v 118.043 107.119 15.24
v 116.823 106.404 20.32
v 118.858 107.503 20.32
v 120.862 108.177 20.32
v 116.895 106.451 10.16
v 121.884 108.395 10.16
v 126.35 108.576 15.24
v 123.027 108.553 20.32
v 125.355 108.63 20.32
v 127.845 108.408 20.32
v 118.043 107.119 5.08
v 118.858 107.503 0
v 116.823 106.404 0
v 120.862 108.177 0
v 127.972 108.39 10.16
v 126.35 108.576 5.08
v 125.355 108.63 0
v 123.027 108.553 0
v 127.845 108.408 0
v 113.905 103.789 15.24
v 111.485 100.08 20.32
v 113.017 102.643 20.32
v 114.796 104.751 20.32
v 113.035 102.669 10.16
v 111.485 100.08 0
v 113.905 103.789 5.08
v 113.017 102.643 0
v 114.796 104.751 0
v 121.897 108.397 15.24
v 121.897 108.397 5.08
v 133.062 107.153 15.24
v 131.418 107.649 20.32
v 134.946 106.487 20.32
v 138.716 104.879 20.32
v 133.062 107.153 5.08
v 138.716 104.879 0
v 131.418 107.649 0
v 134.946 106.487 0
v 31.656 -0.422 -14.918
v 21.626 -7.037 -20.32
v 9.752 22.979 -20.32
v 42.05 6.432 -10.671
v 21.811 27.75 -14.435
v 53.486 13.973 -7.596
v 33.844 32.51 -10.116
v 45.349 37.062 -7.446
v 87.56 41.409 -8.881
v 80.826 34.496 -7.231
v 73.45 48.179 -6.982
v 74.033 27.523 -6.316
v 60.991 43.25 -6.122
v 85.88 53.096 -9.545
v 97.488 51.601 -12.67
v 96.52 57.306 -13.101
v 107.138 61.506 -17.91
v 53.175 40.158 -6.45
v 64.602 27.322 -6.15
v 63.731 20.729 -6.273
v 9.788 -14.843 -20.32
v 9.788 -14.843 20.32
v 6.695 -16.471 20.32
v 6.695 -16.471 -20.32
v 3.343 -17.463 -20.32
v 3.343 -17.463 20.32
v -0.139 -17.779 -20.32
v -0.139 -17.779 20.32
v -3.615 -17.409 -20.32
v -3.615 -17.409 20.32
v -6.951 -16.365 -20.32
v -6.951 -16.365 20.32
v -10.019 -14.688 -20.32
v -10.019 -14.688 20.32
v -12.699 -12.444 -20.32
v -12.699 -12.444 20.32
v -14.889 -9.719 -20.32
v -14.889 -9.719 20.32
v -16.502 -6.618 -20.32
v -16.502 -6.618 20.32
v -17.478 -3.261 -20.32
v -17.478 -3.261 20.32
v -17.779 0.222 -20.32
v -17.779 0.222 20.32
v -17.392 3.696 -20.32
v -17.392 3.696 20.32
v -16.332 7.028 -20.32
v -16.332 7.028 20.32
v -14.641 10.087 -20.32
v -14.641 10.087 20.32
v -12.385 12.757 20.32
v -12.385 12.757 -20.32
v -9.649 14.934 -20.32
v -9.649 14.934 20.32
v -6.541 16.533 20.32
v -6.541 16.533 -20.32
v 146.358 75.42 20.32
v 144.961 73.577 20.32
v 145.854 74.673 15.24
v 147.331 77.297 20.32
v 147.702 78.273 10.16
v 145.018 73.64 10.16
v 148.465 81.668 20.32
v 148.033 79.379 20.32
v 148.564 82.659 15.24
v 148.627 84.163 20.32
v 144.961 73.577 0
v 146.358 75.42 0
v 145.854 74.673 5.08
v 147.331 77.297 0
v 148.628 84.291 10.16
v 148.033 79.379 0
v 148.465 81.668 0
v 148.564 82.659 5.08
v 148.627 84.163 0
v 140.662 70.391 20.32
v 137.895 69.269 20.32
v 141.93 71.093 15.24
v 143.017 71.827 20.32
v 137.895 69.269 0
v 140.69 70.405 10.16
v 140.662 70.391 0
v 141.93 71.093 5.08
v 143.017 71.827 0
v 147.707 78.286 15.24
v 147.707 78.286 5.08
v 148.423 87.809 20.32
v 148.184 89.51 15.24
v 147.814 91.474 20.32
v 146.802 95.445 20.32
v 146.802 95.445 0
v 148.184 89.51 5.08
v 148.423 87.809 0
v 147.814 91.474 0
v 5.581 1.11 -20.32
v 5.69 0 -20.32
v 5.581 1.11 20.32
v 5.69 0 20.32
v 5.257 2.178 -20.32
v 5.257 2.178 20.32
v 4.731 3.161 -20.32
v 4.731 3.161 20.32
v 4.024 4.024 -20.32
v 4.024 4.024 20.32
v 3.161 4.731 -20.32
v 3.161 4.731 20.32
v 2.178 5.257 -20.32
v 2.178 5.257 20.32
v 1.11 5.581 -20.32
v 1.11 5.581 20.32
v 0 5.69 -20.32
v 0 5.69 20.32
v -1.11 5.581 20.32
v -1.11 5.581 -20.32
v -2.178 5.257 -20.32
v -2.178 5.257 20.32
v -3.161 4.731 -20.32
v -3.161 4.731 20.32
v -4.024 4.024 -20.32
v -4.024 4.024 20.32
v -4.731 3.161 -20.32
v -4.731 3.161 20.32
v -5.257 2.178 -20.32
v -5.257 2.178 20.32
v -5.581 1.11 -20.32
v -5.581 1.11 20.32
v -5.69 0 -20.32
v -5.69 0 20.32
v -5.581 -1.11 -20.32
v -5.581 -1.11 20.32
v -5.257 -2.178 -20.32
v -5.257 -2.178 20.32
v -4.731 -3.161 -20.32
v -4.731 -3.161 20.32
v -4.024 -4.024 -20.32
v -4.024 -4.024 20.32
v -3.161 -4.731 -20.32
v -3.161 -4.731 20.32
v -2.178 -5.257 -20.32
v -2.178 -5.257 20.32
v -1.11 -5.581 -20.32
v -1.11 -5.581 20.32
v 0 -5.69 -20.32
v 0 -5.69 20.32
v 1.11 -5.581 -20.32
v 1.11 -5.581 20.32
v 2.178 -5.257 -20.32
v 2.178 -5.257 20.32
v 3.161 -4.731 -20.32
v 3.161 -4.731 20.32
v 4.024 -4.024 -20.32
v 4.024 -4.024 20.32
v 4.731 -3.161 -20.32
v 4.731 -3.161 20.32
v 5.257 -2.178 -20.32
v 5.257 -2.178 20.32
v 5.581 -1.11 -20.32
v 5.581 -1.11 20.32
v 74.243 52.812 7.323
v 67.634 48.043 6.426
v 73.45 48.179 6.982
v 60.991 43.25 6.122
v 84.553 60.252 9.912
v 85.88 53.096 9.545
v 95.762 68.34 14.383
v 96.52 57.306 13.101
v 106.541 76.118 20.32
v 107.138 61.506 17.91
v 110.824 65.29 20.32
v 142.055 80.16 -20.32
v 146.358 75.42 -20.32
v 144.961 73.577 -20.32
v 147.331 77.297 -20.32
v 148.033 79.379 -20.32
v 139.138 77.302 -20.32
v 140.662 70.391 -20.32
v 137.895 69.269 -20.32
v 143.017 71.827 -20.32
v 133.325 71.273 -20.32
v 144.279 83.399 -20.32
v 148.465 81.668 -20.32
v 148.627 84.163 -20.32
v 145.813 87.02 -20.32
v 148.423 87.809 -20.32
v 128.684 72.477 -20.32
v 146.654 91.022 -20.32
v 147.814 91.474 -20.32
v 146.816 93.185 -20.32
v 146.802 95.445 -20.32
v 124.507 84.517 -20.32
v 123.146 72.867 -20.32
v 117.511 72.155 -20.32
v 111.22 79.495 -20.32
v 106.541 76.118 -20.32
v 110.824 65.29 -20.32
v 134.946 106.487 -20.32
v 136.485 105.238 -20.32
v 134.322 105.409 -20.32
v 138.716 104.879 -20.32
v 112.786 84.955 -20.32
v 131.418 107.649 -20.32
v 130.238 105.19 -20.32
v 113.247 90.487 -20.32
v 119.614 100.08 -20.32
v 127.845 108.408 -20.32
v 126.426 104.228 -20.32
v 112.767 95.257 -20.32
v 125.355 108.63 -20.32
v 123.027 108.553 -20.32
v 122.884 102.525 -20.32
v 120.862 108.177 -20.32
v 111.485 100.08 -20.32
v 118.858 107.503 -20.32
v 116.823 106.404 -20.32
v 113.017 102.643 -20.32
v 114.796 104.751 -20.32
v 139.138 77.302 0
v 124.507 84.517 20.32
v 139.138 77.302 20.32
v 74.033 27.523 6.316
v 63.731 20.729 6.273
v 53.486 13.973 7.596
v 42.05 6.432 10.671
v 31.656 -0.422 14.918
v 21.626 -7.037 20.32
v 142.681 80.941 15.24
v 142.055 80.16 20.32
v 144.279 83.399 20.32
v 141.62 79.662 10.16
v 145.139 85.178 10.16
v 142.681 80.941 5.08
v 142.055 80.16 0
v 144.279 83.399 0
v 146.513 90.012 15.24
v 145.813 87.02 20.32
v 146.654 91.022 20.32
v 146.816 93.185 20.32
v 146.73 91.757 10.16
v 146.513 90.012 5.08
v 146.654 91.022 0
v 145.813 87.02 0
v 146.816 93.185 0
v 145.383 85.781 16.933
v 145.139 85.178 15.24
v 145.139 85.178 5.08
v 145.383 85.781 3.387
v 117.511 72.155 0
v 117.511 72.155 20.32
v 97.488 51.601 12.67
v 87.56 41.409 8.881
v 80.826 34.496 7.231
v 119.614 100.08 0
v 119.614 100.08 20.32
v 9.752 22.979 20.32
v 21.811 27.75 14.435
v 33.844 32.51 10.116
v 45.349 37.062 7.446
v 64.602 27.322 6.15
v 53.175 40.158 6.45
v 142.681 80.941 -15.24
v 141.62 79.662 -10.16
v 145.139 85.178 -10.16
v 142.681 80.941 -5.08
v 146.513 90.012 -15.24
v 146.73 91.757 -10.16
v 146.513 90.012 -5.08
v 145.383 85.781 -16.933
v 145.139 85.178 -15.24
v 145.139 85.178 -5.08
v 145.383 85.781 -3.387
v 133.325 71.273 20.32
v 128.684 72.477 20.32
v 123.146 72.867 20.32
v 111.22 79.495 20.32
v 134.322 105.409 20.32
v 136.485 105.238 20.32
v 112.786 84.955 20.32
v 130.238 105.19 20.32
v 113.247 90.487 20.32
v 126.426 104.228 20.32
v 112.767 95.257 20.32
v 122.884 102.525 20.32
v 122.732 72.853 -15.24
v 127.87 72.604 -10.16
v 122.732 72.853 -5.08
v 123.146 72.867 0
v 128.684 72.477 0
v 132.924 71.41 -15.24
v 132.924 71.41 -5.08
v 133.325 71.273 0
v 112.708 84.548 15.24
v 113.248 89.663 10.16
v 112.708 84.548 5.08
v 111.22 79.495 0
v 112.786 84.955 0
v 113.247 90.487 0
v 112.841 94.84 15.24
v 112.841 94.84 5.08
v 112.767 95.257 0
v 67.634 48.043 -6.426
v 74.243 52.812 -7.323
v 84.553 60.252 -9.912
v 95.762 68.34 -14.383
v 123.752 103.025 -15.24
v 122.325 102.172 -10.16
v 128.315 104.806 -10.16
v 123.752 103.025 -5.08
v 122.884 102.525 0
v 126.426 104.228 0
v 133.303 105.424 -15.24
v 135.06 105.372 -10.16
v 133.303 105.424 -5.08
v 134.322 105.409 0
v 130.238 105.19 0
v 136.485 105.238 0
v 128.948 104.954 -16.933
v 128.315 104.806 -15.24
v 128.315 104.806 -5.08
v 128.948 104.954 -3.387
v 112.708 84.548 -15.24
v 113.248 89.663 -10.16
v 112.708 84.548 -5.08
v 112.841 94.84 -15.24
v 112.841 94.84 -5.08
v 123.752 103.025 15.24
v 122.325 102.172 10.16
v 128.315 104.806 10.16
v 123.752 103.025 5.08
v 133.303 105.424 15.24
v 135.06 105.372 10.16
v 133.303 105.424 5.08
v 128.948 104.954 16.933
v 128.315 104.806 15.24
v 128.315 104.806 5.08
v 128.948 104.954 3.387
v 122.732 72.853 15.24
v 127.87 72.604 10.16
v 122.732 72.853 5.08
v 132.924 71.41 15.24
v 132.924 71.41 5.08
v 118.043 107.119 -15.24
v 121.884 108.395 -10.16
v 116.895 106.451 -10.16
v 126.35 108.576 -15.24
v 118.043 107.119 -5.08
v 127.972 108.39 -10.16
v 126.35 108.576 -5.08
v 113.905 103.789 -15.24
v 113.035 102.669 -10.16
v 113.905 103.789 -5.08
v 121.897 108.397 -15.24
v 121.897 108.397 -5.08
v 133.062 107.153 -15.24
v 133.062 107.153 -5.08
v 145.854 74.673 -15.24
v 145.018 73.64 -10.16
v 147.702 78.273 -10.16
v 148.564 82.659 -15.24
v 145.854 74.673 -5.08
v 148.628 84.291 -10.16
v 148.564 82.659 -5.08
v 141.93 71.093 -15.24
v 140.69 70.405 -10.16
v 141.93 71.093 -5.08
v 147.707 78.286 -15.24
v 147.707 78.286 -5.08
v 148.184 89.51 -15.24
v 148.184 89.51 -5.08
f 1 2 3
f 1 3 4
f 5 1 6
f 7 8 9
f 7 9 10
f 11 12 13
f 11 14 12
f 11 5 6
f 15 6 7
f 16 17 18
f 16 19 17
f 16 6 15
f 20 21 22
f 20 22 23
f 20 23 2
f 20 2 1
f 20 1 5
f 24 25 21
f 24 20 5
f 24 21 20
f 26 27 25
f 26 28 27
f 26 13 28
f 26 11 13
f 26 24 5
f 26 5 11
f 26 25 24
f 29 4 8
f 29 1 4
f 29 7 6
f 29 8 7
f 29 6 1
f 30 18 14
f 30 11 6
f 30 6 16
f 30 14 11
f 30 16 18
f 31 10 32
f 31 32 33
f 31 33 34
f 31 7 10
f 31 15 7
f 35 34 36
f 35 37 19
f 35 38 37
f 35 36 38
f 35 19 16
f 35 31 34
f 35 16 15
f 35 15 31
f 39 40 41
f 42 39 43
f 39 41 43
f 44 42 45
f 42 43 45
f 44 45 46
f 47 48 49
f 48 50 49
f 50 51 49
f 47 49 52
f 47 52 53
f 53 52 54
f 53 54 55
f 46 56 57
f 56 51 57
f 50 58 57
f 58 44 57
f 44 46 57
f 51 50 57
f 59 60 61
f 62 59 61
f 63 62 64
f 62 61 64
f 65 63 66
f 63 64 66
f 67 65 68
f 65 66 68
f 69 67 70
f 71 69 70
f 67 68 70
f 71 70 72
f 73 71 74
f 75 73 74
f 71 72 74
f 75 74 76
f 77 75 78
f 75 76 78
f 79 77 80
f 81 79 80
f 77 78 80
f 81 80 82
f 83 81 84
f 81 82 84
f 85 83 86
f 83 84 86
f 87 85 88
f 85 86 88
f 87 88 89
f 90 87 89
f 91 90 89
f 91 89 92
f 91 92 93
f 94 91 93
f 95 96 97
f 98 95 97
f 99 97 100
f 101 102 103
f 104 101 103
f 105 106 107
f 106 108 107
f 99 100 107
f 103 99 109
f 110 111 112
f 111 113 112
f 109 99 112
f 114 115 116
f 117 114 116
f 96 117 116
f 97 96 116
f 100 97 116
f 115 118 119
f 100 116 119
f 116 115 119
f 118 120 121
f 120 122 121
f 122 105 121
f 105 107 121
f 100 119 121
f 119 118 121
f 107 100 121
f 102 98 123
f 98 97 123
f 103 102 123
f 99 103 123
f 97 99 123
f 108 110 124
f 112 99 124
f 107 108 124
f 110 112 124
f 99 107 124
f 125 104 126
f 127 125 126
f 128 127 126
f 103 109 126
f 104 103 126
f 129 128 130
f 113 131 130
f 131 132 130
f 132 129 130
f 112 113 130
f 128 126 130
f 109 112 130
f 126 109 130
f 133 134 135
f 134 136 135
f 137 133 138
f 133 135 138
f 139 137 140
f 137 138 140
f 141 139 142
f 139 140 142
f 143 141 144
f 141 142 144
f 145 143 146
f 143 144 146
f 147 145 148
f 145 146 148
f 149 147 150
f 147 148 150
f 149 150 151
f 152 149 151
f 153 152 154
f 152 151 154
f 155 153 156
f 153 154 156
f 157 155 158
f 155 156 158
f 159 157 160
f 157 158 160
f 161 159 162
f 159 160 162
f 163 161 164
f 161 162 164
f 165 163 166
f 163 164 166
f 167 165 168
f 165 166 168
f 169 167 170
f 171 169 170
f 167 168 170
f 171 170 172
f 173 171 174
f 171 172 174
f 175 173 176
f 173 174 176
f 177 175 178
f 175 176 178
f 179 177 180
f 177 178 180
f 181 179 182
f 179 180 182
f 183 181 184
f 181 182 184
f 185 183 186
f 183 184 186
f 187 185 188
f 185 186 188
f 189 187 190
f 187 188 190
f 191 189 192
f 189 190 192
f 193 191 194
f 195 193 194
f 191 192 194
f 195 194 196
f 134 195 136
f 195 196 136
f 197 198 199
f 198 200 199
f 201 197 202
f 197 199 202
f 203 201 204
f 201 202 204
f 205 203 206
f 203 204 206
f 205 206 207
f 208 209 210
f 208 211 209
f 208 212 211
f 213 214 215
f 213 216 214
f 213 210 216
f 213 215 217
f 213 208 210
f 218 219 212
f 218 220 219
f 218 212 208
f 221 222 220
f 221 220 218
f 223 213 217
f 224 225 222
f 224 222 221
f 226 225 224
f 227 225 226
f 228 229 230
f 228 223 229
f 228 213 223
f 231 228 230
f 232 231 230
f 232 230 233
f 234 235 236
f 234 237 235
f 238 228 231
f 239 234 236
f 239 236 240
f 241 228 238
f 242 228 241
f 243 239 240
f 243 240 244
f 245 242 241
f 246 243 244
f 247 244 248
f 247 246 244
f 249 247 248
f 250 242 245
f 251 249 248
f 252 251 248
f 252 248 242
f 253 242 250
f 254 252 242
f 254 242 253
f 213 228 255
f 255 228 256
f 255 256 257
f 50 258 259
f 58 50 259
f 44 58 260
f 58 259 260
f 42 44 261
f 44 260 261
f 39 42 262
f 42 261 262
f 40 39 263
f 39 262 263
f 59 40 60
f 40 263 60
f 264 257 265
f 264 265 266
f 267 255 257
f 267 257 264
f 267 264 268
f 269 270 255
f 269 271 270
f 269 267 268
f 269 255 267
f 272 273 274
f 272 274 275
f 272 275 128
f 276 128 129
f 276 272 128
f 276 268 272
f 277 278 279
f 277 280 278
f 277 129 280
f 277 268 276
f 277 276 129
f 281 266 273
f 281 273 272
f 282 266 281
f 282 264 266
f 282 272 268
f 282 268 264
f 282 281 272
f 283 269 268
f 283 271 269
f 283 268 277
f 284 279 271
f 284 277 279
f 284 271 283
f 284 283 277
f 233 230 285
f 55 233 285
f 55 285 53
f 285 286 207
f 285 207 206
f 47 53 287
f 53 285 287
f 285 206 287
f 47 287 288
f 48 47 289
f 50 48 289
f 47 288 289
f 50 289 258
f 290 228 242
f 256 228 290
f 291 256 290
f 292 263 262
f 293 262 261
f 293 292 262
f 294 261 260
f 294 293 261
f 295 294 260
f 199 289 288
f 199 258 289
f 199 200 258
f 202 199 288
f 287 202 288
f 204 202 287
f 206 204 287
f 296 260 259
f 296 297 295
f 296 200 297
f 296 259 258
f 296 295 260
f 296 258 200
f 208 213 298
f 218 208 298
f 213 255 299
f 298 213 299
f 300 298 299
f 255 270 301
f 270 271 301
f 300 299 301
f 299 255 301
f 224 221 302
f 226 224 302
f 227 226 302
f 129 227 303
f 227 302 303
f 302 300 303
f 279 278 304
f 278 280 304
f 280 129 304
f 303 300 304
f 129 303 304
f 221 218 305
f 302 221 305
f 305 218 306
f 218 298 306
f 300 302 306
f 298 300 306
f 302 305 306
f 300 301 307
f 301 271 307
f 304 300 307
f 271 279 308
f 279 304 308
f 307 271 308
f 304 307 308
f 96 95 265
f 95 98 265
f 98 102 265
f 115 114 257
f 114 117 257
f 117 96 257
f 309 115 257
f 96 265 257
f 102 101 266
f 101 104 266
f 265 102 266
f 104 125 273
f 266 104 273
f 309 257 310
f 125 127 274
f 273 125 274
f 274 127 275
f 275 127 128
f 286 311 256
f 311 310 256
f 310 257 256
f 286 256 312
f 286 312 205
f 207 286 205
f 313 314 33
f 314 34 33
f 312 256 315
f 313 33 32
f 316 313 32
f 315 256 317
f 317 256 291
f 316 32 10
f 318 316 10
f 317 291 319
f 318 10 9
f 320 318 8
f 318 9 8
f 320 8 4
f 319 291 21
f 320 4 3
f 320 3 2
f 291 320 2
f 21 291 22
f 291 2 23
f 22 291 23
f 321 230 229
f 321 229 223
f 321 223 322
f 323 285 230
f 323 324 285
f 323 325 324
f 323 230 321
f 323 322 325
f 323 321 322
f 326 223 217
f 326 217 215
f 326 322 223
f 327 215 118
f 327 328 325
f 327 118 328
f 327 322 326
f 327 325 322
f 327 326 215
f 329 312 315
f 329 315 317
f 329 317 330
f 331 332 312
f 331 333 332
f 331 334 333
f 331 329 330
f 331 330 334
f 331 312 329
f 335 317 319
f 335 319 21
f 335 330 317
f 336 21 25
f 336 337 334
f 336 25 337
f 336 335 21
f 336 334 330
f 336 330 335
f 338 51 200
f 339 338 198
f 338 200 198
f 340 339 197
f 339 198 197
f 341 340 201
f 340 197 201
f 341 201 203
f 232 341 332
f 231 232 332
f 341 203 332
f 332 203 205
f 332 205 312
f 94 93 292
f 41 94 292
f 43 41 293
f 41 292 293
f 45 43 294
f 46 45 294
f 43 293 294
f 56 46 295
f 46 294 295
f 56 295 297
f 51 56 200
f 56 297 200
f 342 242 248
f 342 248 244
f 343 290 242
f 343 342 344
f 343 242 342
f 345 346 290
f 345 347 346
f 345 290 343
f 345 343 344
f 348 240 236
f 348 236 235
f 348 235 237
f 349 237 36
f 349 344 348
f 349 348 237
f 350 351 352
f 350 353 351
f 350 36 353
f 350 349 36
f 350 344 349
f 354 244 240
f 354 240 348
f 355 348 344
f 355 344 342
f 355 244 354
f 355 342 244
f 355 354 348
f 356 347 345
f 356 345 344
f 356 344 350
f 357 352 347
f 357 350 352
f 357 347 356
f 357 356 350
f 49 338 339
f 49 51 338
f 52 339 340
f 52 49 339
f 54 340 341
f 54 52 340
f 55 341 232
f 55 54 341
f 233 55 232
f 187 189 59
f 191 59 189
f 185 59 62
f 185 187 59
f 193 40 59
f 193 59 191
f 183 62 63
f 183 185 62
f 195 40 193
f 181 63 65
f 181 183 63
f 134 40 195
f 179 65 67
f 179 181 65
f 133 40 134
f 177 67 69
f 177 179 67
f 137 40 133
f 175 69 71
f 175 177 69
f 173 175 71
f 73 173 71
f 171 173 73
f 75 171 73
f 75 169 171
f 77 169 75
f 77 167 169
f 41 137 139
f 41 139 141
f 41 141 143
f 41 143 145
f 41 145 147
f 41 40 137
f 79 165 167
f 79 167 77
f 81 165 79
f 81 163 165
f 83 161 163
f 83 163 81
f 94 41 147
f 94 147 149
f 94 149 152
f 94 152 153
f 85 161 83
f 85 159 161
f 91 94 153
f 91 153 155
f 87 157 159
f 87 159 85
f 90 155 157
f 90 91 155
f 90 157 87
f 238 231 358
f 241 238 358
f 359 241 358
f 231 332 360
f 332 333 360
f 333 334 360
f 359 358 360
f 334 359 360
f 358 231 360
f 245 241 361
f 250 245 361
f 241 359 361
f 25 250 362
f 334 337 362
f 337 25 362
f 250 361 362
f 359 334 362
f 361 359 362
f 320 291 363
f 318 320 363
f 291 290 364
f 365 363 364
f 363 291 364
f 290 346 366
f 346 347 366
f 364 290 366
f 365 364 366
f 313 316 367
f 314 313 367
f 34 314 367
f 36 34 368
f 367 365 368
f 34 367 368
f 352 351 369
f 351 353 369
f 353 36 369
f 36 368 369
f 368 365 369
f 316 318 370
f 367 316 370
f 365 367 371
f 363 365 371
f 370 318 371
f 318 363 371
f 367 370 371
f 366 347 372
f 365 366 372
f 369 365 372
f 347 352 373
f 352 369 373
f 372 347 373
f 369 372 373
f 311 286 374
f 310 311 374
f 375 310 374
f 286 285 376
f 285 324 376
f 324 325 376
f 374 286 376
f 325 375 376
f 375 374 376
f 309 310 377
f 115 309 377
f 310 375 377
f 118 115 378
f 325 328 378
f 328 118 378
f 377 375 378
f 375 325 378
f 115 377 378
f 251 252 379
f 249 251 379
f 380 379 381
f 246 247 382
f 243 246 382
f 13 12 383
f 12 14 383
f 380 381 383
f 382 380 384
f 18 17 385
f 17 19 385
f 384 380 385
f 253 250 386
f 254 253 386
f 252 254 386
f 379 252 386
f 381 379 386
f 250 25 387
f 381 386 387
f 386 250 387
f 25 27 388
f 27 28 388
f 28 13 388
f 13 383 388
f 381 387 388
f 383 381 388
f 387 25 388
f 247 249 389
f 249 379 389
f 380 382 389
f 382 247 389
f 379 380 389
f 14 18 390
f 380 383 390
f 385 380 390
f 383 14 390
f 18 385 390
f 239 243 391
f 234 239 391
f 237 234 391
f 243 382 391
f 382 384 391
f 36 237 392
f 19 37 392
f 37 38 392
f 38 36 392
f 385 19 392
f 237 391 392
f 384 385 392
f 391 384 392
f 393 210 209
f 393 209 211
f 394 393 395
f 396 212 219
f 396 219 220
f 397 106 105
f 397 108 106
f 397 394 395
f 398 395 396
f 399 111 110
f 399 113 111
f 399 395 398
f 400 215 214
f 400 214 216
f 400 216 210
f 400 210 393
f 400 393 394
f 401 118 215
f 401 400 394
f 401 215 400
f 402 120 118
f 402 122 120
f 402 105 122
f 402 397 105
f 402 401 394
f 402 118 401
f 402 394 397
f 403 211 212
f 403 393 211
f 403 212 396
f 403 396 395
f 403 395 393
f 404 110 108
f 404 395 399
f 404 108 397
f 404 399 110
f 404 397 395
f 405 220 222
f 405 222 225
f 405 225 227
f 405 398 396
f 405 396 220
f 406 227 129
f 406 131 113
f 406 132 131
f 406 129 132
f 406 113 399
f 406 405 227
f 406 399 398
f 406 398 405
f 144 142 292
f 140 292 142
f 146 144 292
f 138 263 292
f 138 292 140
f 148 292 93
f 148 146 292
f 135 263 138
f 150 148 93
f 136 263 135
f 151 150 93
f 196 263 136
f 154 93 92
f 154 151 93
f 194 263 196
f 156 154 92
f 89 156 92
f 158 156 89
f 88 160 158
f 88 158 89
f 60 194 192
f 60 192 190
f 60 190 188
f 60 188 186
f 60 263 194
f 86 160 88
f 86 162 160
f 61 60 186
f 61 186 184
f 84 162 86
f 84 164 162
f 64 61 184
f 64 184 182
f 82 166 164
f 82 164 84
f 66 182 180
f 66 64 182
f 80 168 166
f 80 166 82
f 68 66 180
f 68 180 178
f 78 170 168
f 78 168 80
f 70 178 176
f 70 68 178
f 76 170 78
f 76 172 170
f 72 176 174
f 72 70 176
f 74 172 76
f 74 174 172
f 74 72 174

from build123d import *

# Parameters (mm, degrees)
BOSS_EXTRUDE1_DEPTH             = 20.32
BOSS_EXTRUDE1_DEPTH_BACK        = 20.32
SKETCH1_R                       = 10.16
CUT_EXTRUDE2_DEPTH              = 85.09
CUT_EXTRUDE2_DEPTH_BACK         = 85.09
BOSS_EXTRUDE2_REACH             = 187.218
SKETCH4_R                       = 10.16
SKETCH4_R_2                     = 5.690130056
BOSS_EXTRUDE2_DIRECTION_2_REACH = 187.218


with BuildPart() as part:
    # Sketch1 → Boss-Extrude1 (new, two sides: drawn at the far end of the back side and taken through both)
    with BuildSketch(Plane.XY.offset(-BOSS_EXTRUDE1_DEPTH_BACK)):
        with BuildLine():
            Line((-6.540792976, 16.533191684), (60.990787353, 43.249756441))
            Line((60.990787353, 43.249756441), (111.219656073, 79.494763154))
            add(Edge.make_bspline(
                [(111.219656073, 79.494763154), (115.143809103, 89.538582986), (111.485189552, 100.079798905)],
                knots=[0, 0, 0, 1, 1, 1], degree=2))
            add(Edge.make_bspline(
                [(111.485189552, 100.079798905), (118.666753914, 114.310676005), (138.716144692, 104.878983682)],
                knots=[0, 0, 0, 1, 1, 1], degree=2))
            add(Edge.make_bspline(
                [(119.614328761, 100.079798905), (127.464188518, 107.13262314), (138.716144692, 104.878983682)],
                knots=[0, 0, 0, 1, 1, 1], degree=2))
            Line((119.614328761, 100.079798905), (124.506668386, 84.517246437))
            Line((124.506668386, 84.517246437), (139.137891823, 77.302308665))
            add(Edge.make_bspline(
                [(139.137891823, 77.302308665), (147.308308442, 83.981149896), (146.802069804, 95.445404385)],
                knots=[0, 0, 0, 1, 1, 1], degree=2))
            add(Edge.make_bspline(
                [(137.894611709, 69.268806388), (153.056423627, 74.189394673), (146.802069804, 95.445404385)],
                knots=[0, 0, 0, 1, 1, 1], degree=2))
            add(Edge.make_bspline(
                [(117.511141846, 72.154696419), (128.036963673, 74.496569321), (137.894611709, 69.268806388)],
                knots=[0, 0, 0, 1, 1, 1], degree=2))
            Line((117.511141846, 72.154696419), (74.032842511, 27.522572281))
            Line((74.032842511, 27.522572281), (9.788223937, -14.843148998))
            ThreePointArc((9.788223937, -14.843148998), (-15.771973263, -8.208121551), (-6.540792976, 16.533191684))
        make_face()
        Circle(SKETCH1_R, mode=Mode.SUBTRACT)
    extrude(amount=BOSS_EXTRUDE1_DEPTH + BOSS_EXTRUDE1_DEPTH_BACK)

    # Sketch3 → Cut-Extrude2 (cut, two sides: drawn at the far end of the back side and taken through both)
    with BuildSketch(Plane(origin=(-6.540792976, 16.533191684, 0), x_dir=(0.9298757977302595, 0.3678736206844866, 0), z_dir=(-0.3678736206844866, 0.9298757977302596, 0)).offset(-CUT_EXTRUDE2_DEPTH_BACK)):
        with BuildLine():
            Line((17.521009343, 20.32), (69.311227208, 80.494269298))
            Line((69.311227208, 80.494269298), (134.577572969, 24.523321464))
            add(Edge.make_bspline(
                [(17.521009343, 20.32), (76.642520542, -10.04244022), (134.577572969, 24.523321464)],
                knots=[0, 0, 0, 1, 1, 1], degree=2))
        make_face()
        with BuildLine():
            Line((17.521009343, -20.32), (69.311227208, -80.494269298))
            Line((69.311227208, -80.494269298), (134.577572969, -24.523321464))
            add(Edge.make_bspline(
                [(17.521009343, -20.32), (76.642520542, 10.04244022), (134.577572969, -24.523321464)],
                knots=[0, 0, 0, 1, 1, 1], degree=2))
        make_face()
    extrude(amount=CUT_EXTRUDE2_DEPTH + CUT_EXTRUDE2_DEPTH_BACK, mode=Mode.SUBTRACT)

    # Boss-Extrude2: up to this face of the body (flat: up to its plane)
    boss_extrude2_end = Plane(part.part.faces().sort_by_distance((-15.269069271, -7.946397985, 20.32))[0])
    # Sketch4 → Boss-Extrude2 (add, up to the picked face)
    with BuildSketch(Plane.XY, mode=Mode.PRIVATE) as boss_extrude2_sk1:
        Circle(SKETCH4_R)
        Circle(SKETCH4_R_2, mode=Mode.SUBTRACT)
    boss_extrude2_tool1 = split(extrude(boss_extrude2_sk1.sketch, amount=BOSS_EXTRUDE2_REACH, mode=Mode.PRIVATE), bisect_by=boss_extrude2_end, keep=Keep.BOTH, mode=Mode.PRIVATE)
    add(boss_extrude2_tool1.solids().sort_by(Axis((-9.872632, 0, 0), (0, 0, 1)))[0])

    # Boss-Extrude2 direction 2: up to this face of the body (flat: up to its plane)
    boss_extrude2_direction_2_end = Plane(part.part.faces().sort_by_distance((-15.269069271, -7.946397985, -20.32))[0])
    # Sketch4 → Boss-Extrude2 direction 2 (add, up to the picked face)
    with BuildSketch(Plane.XY, mode=Mode.PRIVATE) as boss_extrude2_direction_2_sk1:
        Circle(SKETCH4_R)
        Circle(SKETCH4_R_2, mode=Mode.SUBTRACT)
    boss_extrude2_direction_2_tool1 = split(extrude(boss_extrude2_direction_2_sk1.sketch, amount=-BOSS_EXTRUDE2_DIRECTION_2_REACH, mode=Mode.PRIVATE), bisect_by=boss_extrude2_direction_2_end, keep=Keep.BOTH, mode=Mode.PRIVATE)
    add(boss_extrude2_direction_2_tool1.solids().sort_by(Axis((-9.872632, 0, 0), (0, 0, -1)))[0])


solid = part.part
